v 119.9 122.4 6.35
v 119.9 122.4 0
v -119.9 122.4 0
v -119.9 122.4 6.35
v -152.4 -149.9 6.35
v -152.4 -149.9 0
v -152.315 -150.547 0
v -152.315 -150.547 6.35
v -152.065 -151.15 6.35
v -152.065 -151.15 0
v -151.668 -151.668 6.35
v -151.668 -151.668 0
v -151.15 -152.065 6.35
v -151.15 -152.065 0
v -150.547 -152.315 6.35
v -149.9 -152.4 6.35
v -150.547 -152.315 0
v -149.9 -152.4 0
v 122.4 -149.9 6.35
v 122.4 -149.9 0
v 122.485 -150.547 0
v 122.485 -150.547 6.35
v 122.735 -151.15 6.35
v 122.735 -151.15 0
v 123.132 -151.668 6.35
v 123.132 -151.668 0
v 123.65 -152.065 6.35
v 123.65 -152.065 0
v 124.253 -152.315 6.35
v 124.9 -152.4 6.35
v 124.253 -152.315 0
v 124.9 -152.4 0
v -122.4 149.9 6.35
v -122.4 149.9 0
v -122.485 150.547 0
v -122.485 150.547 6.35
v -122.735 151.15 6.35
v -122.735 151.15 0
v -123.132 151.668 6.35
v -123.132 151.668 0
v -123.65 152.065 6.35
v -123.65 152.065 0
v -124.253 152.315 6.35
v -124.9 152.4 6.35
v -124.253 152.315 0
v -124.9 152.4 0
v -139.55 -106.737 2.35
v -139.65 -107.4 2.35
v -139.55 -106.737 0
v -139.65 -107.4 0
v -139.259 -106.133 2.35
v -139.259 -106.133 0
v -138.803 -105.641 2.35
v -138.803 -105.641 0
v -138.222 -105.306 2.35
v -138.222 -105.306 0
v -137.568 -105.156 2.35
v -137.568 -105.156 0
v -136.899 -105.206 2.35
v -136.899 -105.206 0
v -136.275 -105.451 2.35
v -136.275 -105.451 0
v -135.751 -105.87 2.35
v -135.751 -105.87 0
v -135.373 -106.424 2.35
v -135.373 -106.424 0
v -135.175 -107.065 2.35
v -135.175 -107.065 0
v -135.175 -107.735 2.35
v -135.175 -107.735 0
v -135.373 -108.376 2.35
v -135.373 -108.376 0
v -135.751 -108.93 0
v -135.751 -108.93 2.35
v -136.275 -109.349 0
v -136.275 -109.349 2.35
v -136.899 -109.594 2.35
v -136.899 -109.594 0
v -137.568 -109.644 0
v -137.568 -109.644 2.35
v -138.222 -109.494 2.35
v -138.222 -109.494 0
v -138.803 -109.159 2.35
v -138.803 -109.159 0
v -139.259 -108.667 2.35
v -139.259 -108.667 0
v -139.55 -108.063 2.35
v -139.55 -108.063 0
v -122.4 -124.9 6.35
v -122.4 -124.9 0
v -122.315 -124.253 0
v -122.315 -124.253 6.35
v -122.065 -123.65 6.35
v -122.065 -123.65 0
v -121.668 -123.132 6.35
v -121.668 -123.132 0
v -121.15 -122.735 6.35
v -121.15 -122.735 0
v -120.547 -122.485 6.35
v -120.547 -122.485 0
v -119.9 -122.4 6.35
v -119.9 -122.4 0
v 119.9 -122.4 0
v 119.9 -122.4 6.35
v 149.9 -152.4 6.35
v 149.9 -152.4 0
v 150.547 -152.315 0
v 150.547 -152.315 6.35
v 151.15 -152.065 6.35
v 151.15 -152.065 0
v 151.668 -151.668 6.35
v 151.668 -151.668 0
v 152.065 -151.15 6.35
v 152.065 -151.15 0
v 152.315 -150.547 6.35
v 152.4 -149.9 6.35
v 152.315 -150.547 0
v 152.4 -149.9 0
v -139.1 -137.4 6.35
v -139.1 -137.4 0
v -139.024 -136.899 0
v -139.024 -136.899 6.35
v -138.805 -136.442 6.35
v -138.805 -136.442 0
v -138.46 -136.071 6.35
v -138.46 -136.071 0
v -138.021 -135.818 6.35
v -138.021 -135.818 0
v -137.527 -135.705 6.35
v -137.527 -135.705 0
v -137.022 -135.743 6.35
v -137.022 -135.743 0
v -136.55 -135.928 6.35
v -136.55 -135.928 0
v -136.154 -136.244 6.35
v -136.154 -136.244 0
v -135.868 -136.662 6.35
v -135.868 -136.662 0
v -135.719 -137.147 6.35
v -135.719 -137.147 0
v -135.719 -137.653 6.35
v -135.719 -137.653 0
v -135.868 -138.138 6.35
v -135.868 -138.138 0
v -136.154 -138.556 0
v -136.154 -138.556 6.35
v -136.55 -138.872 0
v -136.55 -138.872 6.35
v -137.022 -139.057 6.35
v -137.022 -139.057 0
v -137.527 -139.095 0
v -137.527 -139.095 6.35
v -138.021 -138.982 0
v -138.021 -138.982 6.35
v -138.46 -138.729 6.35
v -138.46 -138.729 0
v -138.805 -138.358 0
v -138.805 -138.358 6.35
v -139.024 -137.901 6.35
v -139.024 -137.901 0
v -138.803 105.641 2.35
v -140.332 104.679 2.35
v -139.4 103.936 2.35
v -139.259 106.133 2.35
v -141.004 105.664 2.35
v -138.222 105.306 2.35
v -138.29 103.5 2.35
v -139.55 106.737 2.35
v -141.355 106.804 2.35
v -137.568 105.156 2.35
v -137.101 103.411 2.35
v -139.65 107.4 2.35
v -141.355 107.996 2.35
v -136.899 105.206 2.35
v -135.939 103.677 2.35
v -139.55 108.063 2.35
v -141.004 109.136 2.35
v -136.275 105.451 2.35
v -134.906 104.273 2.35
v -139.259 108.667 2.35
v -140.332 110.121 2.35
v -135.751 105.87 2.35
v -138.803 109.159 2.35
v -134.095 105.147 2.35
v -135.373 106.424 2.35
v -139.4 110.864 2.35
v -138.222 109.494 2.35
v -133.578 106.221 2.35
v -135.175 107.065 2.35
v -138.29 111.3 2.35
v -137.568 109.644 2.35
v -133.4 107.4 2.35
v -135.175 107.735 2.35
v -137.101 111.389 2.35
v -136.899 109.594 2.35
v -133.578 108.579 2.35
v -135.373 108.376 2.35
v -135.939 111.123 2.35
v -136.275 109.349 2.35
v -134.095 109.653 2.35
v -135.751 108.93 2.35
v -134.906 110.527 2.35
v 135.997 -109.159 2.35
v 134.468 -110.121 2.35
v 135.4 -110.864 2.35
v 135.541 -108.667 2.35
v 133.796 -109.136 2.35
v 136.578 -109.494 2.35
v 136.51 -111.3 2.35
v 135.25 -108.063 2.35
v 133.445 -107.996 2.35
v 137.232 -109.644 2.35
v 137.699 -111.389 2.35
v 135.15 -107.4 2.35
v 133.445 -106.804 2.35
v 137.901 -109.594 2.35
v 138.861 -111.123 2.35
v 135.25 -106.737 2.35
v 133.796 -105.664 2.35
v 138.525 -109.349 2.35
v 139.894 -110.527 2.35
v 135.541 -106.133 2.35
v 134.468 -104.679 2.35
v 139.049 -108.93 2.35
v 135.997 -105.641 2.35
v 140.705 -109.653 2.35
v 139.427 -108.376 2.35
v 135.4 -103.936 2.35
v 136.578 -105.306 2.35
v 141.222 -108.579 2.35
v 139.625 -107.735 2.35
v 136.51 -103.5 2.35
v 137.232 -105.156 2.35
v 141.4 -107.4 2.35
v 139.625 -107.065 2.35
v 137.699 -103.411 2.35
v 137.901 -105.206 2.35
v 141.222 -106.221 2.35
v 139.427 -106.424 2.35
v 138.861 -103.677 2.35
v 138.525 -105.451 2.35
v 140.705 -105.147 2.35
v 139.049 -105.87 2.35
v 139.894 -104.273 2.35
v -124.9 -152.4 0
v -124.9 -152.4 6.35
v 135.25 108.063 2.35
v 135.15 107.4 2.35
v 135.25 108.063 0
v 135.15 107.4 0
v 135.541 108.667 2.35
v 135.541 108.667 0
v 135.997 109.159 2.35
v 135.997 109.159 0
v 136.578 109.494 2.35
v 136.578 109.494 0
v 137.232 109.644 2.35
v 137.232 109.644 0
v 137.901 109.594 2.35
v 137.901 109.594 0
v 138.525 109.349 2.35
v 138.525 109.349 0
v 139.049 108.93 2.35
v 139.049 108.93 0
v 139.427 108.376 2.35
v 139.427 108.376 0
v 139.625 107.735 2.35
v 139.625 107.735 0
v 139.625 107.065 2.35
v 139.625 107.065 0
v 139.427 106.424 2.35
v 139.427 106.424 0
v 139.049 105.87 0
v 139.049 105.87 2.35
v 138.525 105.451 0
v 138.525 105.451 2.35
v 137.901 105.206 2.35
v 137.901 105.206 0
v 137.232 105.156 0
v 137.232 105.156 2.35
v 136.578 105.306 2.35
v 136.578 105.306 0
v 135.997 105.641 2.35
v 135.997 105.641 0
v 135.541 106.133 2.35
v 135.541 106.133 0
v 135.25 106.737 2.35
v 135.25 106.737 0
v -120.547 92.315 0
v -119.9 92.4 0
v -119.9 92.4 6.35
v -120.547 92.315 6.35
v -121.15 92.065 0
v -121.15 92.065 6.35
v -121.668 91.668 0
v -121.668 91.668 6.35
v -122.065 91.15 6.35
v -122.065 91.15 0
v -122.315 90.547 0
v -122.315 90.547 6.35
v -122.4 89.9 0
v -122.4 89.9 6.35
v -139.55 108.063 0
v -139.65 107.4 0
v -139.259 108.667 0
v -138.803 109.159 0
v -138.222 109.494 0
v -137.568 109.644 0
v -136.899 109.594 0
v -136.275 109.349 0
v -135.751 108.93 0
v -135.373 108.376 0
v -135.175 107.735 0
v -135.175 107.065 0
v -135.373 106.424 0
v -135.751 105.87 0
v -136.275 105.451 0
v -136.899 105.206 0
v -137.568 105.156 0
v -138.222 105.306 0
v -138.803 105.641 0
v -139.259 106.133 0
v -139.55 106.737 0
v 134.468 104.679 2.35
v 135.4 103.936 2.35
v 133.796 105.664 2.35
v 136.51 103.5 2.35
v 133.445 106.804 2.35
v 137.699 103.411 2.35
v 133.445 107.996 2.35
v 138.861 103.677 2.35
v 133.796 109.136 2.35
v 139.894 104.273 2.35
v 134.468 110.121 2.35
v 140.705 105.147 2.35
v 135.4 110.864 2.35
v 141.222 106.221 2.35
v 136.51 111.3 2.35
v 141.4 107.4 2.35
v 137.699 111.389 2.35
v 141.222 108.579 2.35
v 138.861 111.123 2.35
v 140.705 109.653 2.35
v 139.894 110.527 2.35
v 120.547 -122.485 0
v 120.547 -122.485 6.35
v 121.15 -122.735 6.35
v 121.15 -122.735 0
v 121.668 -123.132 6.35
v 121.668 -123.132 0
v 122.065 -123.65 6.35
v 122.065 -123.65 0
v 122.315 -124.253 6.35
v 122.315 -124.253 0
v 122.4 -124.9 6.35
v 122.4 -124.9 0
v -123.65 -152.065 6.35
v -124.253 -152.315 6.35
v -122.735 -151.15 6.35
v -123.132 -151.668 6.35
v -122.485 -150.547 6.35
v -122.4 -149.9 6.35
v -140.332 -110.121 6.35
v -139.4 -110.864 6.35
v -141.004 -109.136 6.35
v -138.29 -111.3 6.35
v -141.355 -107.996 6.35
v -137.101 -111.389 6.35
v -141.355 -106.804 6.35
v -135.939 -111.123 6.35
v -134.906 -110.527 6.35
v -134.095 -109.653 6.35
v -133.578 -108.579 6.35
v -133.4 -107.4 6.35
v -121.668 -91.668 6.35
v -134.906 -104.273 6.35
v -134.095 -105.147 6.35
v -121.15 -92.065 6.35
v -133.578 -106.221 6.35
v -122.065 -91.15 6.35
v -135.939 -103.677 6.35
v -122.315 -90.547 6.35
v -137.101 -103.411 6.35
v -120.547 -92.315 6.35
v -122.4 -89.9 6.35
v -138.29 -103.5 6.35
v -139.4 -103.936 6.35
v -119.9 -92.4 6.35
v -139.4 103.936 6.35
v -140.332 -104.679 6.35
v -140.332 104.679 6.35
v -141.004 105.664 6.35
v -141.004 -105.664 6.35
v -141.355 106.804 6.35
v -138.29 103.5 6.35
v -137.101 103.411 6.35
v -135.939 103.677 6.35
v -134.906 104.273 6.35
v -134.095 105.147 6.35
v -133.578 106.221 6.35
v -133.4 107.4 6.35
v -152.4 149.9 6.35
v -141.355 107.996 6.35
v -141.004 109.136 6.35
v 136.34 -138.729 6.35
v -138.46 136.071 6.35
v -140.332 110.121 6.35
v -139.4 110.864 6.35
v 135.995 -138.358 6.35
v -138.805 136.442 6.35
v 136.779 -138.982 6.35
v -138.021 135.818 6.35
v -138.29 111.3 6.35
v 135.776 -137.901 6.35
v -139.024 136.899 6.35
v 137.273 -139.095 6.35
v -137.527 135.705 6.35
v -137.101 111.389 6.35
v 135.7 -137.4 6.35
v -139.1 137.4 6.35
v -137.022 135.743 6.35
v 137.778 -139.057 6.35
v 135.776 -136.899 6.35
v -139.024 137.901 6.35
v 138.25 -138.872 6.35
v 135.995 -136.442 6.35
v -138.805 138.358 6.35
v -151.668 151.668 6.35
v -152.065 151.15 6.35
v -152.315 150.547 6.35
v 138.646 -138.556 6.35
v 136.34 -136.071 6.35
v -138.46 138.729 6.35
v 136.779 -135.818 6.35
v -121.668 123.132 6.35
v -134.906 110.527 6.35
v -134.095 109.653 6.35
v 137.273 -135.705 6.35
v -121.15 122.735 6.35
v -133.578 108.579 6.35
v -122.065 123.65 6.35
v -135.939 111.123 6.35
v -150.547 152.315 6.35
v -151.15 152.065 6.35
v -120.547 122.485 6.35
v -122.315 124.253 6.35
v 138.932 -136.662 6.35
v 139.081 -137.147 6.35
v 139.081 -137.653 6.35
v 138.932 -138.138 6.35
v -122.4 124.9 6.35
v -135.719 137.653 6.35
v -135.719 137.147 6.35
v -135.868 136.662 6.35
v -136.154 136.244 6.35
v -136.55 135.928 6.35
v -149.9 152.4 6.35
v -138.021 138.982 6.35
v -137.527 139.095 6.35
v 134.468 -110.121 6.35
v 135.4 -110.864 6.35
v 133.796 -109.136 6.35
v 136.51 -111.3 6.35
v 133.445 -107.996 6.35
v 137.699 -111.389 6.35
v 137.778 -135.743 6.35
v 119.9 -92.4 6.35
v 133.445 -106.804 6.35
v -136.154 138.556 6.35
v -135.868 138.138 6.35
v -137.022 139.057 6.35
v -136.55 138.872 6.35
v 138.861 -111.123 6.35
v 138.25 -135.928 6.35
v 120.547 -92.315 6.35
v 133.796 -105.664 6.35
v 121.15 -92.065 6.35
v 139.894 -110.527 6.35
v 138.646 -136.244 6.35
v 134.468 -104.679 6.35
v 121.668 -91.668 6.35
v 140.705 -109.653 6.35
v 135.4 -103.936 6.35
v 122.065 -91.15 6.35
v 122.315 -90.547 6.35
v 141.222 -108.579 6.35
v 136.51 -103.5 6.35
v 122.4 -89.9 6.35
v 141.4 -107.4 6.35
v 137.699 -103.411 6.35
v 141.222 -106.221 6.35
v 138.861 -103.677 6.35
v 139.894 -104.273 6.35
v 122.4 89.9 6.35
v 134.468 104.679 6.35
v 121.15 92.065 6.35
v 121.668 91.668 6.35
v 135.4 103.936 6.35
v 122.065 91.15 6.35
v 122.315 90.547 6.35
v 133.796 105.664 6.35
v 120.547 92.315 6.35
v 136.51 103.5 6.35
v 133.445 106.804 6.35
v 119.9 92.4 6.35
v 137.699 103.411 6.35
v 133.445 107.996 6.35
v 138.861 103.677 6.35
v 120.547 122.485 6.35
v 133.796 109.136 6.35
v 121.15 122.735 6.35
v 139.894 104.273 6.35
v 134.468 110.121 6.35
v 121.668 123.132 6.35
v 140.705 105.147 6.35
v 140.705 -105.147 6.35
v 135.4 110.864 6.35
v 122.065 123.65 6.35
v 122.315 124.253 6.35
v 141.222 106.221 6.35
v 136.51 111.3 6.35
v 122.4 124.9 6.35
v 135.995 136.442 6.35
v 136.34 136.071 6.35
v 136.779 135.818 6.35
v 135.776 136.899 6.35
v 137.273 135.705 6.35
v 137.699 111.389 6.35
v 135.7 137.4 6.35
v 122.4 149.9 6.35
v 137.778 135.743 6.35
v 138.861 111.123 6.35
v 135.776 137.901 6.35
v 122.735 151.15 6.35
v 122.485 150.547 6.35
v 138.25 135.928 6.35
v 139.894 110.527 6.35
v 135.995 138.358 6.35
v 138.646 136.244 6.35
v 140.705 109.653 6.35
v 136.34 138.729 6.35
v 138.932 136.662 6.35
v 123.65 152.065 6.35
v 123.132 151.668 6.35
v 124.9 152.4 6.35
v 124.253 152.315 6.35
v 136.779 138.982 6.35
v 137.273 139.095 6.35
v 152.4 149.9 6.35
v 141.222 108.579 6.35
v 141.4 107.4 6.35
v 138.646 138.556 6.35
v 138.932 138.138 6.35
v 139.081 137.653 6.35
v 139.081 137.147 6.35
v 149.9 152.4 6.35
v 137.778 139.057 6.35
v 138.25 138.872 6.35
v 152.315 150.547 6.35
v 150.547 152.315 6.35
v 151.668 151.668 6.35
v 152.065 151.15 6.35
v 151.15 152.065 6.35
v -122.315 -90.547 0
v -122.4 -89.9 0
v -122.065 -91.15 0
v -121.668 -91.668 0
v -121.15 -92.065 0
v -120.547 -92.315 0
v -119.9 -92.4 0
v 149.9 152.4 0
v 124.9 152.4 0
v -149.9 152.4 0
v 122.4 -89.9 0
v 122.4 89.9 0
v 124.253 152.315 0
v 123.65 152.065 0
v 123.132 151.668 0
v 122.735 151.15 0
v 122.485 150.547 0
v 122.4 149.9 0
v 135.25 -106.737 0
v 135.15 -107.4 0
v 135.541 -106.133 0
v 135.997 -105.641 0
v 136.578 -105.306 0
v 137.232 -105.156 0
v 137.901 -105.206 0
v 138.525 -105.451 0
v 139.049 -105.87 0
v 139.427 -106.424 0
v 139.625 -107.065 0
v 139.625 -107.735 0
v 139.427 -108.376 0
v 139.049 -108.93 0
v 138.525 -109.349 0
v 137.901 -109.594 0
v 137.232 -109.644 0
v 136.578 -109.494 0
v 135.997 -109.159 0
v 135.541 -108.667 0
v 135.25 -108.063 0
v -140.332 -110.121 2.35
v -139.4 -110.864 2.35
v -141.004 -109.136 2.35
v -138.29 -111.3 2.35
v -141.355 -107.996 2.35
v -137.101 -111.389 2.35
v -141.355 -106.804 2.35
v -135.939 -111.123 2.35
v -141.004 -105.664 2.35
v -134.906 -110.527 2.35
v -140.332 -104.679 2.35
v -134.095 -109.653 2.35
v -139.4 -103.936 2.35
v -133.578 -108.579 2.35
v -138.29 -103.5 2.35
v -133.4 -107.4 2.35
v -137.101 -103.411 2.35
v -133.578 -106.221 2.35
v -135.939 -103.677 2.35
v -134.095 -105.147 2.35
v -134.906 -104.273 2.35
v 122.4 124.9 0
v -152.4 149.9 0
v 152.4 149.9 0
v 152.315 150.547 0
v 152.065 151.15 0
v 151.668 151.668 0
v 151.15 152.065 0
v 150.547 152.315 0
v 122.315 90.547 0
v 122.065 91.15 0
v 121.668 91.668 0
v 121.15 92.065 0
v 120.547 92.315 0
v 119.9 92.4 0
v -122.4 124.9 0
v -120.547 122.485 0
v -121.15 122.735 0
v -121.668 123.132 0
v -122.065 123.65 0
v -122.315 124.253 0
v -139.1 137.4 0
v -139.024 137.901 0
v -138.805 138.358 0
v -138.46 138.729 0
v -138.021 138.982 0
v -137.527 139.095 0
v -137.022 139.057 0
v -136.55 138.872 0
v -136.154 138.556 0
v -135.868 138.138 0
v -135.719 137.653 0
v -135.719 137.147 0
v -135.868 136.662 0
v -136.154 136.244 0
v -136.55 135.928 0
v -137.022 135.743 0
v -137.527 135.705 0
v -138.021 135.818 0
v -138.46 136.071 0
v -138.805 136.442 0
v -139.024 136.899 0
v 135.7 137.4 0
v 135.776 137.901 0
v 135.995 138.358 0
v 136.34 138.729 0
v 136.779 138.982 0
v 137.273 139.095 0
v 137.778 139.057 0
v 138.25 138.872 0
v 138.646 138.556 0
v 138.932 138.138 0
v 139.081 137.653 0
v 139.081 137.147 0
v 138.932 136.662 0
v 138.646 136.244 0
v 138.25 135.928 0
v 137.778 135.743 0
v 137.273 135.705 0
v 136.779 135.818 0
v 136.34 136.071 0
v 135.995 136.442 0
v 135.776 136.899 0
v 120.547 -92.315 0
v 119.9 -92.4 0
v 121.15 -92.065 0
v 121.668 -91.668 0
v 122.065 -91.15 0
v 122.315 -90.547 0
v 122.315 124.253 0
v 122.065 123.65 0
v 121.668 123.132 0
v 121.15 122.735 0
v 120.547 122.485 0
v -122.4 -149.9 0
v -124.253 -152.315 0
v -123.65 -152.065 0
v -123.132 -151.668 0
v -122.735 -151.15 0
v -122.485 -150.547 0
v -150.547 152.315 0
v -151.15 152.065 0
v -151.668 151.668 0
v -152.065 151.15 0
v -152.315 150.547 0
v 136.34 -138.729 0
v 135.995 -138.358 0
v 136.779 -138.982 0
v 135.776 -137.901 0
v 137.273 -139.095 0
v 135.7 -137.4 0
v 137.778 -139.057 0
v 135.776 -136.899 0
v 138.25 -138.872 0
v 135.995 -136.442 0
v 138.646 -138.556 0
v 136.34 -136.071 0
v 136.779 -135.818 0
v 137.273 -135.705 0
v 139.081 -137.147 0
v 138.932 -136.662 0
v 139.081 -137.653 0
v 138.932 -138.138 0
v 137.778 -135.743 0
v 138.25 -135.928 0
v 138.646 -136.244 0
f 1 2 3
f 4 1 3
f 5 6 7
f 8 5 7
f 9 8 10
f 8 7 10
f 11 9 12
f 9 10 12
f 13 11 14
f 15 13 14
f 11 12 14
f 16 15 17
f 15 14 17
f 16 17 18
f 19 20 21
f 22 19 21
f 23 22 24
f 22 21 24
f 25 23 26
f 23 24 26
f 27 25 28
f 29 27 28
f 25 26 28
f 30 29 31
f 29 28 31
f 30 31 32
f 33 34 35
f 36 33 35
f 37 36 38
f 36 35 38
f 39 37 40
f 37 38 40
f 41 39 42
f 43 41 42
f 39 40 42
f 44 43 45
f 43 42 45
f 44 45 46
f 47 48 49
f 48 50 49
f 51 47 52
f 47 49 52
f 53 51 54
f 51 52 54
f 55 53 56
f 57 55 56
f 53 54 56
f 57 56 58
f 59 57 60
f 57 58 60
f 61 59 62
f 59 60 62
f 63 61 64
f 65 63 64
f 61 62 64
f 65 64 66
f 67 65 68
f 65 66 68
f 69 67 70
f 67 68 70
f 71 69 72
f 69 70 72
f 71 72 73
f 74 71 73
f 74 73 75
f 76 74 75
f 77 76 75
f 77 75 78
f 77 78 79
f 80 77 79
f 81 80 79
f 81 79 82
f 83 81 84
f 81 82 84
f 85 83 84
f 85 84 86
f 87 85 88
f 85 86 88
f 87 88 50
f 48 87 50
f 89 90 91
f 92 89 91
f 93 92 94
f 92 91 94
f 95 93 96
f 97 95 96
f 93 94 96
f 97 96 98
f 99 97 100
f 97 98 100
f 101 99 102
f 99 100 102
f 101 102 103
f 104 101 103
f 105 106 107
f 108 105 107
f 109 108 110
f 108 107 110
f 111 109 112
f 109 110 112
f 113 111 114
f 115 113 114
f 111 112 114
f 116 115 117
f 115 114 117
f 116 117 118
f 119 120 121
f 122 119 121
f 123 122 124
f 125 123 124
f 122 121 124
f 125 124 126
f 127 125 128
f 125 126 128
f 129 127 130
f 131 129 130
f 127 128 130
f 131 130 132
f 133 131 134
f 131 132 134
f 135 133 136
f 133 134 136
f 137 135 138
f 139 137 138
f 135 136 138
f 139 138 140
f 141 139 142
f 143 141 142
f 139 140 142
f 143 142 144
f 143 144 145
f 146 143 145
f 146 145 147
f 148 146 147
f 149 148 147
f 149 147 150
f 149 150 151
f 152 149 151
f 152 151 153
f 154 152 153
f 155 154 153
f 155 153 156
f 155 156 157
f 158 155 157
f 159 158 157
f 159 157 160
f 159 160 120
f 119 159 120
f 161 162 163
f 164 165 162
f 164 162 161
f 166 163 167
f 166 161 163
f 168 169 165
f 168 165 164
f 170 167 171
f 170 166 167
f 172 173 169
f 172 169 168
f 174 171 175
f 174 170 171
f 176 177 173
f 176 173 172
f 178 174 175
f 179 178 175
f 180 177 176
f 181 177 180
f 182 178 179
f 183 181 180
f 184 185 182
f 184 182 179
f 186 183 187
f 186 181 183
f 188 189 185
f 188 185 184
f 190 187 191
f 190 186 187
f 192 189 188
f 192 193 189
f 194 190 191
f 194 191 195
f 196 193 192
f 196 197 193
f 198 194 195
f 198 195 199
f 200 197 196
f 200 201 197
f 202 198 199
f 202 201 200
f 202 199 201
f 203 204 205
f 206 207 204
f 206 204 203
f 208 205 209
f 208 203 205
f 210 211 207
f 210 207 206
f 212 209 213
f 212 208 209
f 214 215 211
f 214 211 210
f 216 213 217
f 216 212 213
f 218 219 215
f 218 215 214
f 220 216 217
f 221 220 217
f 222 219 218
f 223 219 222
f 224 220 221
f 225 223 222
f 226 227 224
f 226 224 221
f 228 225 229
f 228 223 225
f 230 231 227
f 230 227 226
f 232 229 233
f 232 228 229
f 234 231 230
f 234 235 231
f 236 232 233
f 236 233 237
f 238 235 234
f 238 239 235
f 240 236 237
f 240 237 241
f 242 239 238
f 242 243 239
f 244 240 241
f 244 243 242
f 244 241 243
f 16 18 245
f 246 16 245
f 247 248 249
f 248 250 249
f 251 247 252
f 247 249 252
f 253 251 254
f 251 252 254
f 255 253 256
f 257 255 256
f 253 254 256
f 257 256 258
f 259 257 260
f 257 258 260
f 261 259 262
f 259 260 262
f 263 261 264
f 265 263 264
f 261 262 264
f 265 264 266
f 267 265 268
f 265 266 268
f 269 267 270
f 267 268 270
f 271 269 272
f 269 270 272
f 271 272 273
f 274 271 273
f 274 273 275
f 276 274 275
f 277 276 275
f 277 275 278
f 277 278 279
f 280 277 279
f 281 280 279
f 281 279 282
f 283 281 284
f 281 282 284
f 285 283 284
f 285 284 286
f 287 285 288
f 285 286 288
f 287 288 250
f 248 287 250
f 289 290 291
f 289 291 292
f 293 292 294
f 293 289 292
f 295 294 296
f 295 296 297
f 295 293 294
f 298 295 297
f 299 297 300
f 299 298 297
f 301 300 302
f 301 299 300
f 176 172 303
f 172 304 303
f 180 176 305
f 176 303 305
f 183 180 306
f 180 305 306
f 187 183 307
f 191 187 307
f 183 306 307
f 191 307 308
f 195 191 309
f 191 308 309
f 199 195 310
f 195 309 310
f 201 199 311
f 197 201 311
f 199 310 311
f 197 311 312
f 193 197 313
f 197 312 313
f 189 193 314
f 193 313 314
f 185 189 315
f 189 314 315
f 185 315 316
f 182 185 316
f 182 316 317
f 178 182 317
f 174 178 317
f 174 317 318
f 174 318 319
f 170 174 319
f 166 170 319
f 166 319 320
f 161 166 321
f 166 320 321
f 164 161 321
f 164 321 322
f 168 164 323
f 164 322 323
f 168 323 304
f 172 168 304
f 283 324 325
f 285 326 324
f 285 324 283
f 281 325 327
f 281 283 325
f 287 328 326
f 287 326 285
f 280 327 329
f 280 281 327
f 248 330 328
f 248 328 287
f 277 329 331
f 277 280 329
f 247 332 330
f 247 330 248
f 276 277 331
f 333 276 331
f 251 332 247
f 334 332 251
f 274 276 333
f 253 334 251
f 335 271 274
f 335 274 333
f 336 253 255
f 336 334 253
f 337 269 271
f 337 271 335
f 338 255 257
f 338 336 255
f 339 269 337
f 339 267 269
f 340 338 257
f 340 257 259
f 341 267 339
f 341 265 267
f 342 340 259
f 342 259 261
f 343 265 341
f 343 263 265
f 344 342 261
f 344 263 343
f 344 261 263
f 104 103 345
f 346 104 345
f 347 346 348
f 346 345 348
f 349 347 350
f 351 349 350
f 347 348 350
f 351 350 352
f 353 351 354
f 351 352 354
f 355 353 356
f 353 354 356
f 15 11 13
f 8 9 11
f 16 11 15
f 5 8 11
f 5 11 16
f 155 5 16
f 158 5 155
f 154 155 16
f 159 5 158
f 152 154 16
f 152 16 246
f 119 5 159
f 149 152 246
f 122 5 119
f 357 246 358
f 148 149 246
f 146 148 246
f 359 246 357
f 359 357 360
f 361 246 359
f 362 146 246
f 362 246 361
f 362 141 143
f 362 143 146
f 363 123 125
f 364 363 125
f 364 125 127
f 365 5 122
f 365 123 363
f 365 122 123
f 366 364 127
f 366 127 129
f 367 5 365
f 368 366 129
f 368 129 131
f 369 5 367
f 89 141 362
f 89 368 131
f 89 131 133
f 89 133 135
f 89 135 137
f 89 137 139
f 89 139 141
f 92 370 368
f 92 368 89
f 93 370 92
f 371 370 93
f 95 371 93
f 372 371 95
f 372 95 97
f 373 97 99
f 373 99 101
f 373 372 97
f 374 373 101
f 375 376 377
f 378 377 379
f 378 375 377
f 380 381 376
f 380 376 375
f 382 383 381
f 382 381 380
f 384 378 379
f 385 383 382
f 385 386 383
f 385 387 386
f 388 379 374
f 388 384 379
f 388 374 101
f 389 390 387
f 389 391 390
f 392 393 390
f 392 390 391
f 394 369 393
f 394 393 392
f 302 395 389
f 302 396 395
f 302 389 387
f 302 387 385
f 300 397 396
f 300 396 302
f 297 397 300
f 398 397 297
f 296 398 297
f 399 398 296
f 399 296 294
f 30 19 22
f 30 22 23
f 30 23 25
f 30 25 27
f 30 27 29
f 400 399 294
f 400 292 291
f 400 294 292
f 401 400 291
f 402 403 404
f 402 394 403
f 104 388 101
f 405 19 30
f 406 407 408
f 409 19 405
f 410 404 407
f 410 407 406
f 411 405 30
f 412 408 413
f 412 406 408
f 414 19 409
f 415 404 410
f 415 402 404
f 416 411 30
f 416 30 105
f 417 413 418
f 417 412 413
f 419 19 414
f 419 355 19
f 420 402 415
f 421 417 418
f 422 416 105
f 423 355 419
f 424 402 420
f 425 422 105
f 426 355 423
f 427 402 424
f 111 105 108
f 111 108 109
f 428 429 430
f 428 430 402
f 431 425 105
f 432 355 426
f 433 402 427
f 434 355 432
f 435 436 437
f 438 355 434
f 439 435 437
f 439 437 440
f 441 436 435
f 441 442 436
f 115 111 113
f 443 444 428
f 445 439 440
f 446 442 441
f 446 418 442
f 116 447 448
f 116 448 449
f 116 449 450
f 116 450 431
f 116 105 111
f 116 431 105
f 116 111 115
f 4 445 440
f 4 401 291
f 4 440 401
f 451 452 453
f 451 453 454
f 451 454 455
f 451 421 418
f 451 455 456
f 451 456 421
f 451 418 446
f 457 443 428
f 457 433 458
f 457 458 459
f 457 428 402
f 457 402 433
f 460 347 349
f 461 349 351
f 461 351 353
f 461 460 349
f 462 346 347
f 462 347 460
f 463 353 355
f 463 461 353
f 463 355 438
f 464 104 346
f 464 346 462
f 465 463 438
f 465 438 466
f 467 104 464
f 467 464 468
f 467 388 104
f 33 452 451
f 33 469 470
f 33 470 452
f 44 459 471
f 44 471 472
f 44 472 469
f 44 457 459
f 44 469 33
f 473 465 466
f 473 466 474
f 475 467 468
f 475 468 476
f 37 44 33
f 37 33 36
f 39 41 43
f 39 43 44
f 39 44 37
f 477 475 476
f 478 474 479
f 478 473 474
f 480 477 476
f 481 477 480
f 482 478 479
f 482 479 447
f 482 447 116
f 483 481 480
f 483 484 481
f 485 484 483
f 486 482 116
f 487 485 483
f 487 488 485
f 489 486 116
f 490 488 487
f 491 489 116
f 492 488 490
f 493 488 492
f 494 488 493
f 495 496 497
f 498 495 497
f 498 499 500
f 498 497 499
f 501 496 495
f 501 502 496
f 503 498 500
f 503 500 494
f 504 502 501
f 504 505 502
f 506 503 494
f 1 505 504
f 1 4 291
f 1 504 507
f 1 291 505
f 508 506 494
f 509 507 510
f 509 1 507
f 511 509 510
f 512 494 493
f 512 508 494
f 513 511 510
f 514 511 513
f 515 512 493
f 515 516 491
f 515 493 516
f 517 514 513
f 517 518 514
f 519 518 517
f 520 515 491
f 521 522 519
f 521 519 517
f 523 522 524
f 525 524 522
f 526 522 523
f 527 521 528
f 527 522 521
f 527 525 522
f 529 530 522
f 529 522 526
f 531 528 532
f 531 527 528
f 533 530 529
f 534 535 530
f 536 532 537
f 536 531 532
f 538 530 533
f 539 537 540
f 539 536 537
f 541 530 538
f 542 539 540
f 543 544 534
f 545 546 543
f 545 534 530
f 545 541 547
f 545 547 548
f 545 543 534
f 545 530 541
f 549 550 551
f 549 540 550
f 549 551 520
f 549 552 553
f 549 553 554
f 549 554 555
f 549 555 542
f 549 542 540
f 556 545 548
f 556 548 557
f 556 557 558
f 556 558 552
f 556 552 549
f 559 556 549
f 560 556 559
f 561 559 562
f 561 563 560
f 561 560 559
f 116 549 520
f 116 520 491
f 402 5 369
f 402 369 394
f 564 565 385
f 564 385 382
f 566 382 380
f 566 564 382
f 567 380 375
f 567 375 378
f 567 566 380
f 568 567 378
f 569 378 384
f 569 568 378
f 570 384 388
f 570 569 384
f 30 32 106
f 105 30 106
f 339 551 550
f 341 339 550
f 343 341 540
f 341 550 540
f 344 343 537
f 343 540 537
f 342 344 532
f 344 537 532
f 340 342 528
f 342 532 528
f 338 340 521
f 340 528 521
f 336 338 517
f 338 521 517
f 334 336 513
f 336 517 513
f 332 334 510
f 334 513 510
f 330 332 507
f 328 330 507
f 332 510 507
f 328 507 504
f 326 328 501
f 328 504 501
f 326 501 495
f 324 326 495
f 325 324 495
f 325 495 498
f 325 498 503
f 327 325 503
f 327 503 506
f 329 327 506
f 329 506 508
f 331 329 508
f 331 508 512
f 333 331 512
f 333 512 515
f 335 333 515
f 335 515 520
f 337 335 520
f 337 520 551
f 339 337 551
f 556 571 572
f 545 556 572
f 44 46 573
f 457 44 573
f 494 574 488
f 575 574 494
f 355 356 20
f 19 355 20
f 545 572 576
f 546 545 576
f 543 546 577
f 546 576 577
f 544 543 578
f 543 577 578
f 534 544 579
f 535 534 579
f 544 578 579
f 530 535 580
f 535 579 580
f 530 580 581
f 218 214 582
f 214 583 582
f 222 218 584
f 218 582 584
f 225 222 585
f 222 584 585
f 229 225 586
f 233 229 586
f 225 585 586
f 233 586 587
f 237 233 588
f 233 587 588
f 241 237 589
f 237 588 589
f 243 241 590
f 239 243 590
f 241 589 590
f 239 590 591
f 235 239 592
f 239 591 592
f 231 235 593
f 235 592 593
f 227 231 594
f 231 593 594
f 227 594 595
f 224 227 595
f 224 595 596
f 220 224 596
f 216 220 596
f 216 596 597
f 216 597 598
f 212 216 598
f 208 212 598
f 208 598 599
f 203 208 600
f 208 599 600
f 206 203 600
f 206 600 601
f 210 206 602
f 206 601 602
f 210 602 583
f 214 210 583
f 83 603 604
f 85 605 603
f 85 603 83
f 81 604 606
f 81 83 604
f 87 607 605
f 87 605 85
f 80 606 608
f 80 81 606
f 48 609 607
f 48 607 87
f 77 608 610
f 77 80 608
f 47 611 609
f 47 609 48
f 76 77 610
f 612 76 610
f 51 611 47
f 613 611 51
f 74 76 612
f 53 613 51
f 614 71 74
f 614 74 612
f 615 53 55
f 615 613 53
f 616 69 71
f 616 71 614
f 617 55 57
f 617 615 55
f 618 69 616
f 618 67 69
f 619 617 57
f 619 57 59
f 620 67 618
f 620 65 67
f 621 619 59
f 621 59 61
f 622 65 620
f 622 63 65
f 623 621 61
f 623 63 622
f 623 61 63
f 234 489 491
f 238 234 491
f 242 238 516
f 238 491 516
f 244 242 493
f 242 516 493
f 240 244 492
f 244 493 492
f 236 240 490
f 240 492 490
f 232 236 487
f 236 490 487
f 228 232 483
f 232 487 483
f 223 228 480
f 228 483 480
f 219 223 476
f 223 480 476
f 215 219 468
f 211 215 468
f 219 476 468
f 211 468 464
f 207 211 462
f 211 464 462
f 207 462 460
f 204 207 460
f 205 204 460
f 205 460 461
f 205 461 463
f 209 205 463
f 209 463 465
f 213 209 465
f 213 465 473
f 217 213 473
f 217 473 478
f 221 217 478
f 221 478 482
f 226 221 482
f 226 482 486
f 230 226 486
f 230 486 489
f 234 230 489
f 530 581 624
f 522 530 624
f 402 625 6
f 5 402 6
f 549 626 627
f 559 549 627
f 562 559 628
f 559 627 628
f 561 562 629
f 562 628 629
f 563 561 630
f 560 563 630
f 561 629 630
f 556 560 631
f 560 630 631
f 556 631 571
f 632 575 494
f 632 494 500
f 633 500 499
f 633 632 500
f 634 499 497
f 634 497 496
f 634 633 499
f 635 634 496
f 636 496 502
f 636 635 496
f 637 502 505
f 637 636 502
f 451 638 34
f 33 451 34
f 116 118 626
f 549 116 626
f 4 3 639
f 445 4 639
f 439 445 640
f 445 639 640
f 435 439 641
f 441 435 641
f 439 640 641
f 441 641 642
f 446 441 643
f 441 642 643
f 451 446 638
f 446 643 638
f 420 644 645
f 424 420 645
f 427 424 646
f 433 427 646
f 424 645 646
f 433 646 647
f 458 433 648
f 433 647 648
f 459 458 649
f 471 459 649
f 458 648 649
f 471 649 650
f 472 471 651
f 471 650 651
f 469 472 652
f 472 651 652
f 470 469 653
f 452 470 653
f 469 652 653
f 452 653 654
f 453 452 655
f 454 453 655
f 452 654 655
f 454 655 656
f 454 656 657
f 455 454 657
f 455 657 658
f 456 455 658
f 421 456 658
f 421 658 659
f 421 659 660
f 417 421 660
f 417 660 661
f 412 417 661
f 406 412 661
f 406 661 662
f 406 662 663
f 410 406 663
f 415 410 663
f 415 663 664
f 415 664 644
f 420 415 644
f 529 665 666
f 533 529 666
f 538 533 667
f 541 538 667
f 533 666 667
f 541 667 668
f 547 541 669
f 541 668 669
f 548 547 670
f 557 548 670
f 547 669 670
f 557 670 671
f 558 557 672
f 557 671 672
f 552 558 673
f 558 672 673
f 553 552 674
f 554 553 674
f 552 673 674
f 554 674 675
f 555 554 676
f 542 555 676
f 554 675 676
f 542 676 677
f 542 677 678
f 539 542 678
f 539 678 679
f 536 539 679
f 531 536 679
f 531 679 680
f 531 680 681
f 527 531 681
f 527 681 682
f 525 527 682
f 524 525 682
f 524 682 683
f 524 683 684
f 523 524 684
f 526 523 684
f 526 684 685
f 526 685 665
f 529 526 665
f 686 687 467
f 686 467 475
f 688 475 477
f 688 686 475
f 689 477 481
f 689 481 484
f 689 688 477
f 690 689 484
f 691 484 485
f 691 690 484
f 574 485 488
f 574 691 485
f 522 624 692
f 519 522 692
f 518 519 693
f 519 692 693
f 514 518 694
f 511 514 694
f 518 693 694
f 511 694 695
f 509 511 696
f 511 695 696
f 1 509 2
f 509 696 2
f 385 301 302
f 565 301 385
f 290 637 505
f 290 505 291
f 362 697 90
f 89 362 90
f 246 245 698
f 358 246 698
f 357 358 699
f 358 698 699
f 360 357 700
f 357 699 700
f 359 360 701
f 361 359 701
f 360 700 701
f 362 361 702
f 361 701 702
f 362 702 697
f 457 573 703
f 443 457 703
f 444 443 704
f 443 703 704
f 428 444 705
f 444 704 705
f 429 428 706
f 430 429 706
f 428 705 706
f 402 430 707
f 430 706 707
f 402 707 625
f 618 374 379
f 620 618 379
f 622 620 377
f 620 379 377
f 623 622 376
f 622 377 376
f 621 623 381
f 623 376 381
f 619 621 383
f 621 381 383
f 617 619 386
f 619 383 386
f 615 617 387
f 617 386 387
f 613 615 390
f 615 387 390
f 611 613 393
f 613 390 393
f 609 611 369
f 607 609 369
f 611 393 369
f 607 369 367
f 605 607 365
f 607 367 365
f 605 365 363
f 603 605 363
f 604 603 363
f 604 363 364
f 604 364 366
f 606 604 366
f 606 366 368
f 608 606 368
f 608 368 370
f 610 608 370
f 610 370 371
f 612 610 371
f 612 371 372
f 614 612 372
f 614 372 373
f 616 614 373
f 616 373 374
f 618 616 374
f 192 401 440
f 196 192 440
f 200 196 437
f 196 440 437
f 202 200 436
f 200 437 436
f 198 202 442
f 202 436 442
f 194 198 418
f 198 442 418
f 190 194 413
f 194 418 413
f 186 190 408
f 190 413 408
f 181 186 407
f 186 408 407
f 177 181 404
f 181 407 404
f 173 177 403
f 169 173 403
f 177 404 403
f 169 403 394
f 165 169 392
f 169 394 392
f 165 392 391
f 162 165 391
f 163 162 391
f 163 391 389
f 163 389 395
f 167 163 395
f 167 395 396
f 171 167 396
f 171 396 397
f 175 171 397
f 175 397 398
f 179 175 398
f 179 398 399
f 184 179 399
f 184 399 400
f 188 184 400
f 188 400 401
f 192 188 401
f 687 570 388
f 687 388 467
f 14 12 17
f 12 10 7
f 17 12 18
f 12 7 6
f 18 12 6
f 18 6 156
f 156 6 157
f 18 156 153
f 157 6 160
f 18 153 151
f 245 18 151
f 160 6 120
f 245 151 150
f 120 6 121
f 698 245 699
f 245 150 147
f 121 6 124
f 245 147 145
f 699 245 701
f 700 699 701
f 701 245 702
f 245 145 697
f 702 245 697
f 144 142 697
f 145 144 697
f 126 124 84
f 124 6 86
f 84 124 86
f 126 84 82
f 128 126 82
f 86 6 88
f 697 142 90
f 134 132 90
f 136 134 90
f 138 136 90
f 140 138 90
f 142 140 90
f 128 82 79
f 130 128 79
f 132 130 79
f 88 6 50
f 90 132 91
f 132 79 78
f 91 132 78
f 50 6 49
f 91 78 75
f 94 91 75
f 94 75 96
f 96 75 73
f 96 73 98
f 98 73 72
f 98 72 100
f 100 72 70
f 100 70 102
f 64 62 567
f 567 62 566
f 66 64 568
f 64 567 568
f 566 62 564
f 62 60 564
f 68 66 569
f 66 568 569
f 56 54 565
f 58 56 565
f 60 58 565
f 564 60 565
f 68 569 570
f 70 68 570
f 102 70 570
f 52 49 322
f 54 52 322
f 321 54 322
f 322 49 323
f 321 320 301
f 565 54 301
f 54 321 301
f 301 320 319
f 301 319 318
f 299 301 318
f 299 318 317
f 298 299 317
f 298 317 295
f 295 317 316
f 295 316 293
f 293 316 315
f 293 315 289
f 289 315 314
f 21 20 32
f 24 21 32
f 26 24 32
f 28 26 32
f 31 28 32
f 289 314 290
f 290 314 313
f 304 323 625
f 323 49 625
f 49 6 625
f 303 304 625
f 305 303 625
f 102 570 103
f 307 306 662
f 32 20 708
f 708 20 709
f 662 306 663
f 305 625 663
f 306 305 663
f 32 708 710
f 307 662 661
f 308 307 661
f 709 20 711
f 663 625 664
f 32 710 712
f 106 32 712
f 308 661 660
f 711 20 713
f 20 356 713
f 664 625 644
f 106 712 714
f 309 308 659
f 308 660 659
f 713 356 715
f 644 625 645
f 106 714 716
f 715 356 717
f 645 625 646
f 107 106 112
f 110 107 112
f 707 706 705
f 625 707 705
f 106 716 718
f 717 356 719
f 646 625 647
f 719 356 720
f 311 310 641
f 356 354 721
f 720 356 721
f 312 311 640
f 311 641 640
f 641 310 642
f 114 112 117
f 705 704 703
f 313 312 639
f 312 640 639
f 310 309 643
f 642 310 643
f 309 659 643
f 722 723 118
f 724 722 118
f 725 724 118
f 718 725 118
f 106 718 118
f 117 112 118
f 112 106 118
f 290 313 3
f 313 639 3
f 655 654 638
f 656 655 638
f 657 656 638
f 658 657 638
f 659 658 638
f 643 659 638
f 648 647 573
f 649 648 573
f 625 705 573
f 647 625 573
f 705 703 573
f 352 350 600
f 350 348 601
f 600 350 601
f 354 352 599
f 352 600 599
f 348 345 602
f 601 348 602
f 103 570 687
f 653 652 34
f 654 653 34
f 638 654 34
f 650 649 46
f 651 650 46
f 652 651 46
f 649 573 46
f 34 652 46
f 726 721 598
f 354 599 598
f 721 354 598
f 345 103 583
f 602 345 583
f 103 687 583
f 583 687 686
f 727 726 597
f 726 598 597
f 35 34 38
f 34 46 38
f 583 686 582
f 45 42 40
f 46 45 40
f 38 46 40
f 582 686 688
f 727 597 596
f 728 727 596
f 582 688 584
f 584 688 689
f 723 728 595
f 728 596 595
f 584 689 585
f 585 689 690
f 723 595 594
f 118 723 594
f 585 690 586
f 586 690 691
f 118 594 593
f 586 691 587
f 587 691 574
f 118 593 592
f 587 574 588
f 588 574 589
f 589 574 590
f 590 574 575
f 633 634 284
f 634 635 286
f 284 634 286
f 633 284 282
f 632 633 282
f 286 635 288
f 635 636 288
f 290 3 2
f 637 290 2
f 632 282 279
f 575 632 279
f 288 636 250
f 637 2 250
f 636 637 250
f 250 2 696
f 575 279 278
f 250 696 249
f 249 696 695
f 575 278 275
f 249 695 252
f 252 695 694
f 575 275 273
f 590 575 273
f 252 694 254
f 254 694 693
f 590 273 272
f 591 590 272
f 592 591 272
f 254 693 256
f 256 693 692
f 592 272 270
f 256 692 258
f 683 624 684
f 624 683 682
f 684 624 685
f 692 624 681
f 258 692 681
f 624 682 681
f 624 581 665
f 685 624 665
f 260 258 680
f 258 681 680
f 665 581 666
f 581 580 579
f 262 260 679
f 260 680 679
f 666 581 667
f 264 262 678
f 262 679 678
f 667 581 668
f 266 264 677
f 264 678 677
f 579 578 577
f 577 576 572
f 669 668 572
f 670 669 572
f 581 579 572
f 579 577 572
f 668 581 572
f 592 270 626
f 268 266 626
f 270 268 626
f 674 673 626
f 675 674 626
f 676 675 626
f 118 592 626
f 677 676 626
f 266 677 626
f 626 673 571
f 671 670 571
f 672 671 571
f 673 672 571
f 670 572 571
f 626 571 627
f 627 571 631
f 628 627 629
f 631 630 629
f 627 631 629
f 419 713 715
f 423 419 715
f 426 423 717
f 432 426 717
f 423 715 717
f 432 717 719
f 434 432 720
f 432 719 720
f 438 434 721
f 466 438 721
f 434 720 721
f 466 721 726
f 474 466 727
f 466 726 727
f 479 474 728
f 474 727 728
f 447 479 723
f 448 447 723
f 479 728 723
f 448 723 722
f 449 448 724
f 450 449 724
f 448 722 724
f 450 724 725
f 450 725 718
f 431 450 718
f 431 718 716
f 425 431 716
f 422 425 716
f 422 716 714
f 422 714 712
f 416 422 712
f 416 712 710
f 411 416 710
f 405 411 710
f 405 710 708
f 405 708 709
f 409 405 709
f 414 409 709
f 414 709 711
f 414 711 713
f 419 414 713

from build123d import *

# Parameters (mm, degrees)
BOSS_EXTRUDE1_DEPTH            = 6.35
CBORE_FOR_M4_SHCS1_D           = 4.5
CBORE_FOR_M4_SHCS1_CBORE_D     = 8
CBORE_FOR_M4_SHCS1_CBORE_DEPTH = 4
M3_CLEARANCE_HOLE2_D           = 3.4


with BuildPart() as part:
    # Sketch7 → Boss-Extrude1 (new body)
    with BuildSketch(Plane.XY):
        with BuildLine():
            Line((-119.9, -122.4), (119.9, -122.4))
            ThreePointArc((119.9, -122.4), (121.667766953, -123.132233047), (122.4, -124.9))
            Line((122.4, -124.9), (122.4, -149.9))
            ThreePointArc((122.4, -149.9), (123.132233047, -151.667766953), (124.9, -152.4))
            Line((124.9, -152.4), (149.9, -152.4))
            ThreePointArc((149.9, -152.4), (151.667766953, -151.667766953), (152.4, -149.9))
            Line((152.4, -149.9), (152.4, -102.186961883))
            Line((152.4, -102.186961883), (152.4, 120.74319893))
            Line((152.4, 120.74319893), (152.4, 149.9))
            ThreePointArc((152.4, 149.9), (151.667766953, 151.667766953), (149.9, 152.4))
            Line((149.9, 152.4), (124.9, 152.4))
            ThreePointArc((124.9, 152.4), (123.132233047, 151.667766953), (122.4, 149.9))
            Line((122.4, 149.9), (122.4, 124.9))
            ThreePointArc((122.4, 124.9), (121.667766953, 123.132233047), (119.9, 122.4))
            Line((119.9, 122.4), (-119.9, 122.4))
            ThreePointArc((-119.9, 122.4), (-121.667766953, 123.132233047), (-122.4, 124.9))
            Line((-122.4, 124.9), (-122.4, 149.9))
            ThreePointArc((-122.4, 149.9), (-123.132233047, 151.667766953), (-124.9, 152.4))
            Line((-124.9, 152.4), (-149.9, 152.4))
            ThreePointArc((-149.9, 152.4), (-151.667766953, 151.667766953), (-152.4, 149.9))
            Line((-152.4, 149.9), (-152.4, 102.186961883))
            Line((-152.4, 102.186961883), (-152.4, -120.74319893))
            Line((-152.4, -120.74319893), (-152.4, -149.9))
            ThreePointArc((-152.4, -149.9), (-151.667766953, -151.667766953), (-149.9, -152.4))
            Line((-149.9, -152.4), (-124.9, -152.4))
            ThreePointArc((-124.9, -152.4), (-123.132233047, -151.667766953), (-122.4, -149.9))
            Line((-122.4, -149.9), (-122.4, -124.9))
            ThreePointArc((-122.4, -124.9), (-121.667766953, -123.132233047), (-119.9, -122.4))
        make_face()
        with BuildLine():
            Line((-119.9, -92.4), (119.9, -92.4))
            ThreePointArc((119.9, -92.4), (121.667766953, -91.667766953), (122.4, -89.9))
            Line((122.4, -89.9), (122.4, 89.9))
            ThreePointArc((122.4, 89.9), (121.667766953, 91.667766953), (119.9, 92.4))
            Line((119.9, 92.4), (-119.9, 92.4))
            ThreePointArc((-119.9, 92.4), (-121.667766953, 91.667766953), (-122.4, 89.9))
            Line((-122.4, 89.9), (-122.4, -89.9))
            ThreePointArc((-122.4, -89.9), (-121.667766953, -91.667766953), (-119.9, -92.4))
        make_face(mode=Mode.SUBTRACT)
    extrude(amount=BOSS_EXTRUDE1_DEPTH)

    # CBORE for M4 SHCS1 (through all)
    with Locations(Plane.XY.offset(6.35)):
        with Locations((-137.4, 107.4), (-137.4, -107.4), (137.4, -107.4), (137.4, 107.4)):
            CounterBoreHole(CBORE_FOR_M4_SHCS1_D / 2, CBORE_FOR_M4_SHCS1_CBORE_D / 2, CBORE_FOR_M4_SHCS1_CBORE_DEPTH)

    # M3 Clearance Hole2 (through all)
    with Locations(Plane.XY.offset(6.35)):
        with Locations((-137.4, 137.4), (137.4, 137.4), (137.4, -137.4), (-137.4, -137.4)):
            Hole(M3_CLEARANCE_HOLE2_D / 2)


solid = part.part
